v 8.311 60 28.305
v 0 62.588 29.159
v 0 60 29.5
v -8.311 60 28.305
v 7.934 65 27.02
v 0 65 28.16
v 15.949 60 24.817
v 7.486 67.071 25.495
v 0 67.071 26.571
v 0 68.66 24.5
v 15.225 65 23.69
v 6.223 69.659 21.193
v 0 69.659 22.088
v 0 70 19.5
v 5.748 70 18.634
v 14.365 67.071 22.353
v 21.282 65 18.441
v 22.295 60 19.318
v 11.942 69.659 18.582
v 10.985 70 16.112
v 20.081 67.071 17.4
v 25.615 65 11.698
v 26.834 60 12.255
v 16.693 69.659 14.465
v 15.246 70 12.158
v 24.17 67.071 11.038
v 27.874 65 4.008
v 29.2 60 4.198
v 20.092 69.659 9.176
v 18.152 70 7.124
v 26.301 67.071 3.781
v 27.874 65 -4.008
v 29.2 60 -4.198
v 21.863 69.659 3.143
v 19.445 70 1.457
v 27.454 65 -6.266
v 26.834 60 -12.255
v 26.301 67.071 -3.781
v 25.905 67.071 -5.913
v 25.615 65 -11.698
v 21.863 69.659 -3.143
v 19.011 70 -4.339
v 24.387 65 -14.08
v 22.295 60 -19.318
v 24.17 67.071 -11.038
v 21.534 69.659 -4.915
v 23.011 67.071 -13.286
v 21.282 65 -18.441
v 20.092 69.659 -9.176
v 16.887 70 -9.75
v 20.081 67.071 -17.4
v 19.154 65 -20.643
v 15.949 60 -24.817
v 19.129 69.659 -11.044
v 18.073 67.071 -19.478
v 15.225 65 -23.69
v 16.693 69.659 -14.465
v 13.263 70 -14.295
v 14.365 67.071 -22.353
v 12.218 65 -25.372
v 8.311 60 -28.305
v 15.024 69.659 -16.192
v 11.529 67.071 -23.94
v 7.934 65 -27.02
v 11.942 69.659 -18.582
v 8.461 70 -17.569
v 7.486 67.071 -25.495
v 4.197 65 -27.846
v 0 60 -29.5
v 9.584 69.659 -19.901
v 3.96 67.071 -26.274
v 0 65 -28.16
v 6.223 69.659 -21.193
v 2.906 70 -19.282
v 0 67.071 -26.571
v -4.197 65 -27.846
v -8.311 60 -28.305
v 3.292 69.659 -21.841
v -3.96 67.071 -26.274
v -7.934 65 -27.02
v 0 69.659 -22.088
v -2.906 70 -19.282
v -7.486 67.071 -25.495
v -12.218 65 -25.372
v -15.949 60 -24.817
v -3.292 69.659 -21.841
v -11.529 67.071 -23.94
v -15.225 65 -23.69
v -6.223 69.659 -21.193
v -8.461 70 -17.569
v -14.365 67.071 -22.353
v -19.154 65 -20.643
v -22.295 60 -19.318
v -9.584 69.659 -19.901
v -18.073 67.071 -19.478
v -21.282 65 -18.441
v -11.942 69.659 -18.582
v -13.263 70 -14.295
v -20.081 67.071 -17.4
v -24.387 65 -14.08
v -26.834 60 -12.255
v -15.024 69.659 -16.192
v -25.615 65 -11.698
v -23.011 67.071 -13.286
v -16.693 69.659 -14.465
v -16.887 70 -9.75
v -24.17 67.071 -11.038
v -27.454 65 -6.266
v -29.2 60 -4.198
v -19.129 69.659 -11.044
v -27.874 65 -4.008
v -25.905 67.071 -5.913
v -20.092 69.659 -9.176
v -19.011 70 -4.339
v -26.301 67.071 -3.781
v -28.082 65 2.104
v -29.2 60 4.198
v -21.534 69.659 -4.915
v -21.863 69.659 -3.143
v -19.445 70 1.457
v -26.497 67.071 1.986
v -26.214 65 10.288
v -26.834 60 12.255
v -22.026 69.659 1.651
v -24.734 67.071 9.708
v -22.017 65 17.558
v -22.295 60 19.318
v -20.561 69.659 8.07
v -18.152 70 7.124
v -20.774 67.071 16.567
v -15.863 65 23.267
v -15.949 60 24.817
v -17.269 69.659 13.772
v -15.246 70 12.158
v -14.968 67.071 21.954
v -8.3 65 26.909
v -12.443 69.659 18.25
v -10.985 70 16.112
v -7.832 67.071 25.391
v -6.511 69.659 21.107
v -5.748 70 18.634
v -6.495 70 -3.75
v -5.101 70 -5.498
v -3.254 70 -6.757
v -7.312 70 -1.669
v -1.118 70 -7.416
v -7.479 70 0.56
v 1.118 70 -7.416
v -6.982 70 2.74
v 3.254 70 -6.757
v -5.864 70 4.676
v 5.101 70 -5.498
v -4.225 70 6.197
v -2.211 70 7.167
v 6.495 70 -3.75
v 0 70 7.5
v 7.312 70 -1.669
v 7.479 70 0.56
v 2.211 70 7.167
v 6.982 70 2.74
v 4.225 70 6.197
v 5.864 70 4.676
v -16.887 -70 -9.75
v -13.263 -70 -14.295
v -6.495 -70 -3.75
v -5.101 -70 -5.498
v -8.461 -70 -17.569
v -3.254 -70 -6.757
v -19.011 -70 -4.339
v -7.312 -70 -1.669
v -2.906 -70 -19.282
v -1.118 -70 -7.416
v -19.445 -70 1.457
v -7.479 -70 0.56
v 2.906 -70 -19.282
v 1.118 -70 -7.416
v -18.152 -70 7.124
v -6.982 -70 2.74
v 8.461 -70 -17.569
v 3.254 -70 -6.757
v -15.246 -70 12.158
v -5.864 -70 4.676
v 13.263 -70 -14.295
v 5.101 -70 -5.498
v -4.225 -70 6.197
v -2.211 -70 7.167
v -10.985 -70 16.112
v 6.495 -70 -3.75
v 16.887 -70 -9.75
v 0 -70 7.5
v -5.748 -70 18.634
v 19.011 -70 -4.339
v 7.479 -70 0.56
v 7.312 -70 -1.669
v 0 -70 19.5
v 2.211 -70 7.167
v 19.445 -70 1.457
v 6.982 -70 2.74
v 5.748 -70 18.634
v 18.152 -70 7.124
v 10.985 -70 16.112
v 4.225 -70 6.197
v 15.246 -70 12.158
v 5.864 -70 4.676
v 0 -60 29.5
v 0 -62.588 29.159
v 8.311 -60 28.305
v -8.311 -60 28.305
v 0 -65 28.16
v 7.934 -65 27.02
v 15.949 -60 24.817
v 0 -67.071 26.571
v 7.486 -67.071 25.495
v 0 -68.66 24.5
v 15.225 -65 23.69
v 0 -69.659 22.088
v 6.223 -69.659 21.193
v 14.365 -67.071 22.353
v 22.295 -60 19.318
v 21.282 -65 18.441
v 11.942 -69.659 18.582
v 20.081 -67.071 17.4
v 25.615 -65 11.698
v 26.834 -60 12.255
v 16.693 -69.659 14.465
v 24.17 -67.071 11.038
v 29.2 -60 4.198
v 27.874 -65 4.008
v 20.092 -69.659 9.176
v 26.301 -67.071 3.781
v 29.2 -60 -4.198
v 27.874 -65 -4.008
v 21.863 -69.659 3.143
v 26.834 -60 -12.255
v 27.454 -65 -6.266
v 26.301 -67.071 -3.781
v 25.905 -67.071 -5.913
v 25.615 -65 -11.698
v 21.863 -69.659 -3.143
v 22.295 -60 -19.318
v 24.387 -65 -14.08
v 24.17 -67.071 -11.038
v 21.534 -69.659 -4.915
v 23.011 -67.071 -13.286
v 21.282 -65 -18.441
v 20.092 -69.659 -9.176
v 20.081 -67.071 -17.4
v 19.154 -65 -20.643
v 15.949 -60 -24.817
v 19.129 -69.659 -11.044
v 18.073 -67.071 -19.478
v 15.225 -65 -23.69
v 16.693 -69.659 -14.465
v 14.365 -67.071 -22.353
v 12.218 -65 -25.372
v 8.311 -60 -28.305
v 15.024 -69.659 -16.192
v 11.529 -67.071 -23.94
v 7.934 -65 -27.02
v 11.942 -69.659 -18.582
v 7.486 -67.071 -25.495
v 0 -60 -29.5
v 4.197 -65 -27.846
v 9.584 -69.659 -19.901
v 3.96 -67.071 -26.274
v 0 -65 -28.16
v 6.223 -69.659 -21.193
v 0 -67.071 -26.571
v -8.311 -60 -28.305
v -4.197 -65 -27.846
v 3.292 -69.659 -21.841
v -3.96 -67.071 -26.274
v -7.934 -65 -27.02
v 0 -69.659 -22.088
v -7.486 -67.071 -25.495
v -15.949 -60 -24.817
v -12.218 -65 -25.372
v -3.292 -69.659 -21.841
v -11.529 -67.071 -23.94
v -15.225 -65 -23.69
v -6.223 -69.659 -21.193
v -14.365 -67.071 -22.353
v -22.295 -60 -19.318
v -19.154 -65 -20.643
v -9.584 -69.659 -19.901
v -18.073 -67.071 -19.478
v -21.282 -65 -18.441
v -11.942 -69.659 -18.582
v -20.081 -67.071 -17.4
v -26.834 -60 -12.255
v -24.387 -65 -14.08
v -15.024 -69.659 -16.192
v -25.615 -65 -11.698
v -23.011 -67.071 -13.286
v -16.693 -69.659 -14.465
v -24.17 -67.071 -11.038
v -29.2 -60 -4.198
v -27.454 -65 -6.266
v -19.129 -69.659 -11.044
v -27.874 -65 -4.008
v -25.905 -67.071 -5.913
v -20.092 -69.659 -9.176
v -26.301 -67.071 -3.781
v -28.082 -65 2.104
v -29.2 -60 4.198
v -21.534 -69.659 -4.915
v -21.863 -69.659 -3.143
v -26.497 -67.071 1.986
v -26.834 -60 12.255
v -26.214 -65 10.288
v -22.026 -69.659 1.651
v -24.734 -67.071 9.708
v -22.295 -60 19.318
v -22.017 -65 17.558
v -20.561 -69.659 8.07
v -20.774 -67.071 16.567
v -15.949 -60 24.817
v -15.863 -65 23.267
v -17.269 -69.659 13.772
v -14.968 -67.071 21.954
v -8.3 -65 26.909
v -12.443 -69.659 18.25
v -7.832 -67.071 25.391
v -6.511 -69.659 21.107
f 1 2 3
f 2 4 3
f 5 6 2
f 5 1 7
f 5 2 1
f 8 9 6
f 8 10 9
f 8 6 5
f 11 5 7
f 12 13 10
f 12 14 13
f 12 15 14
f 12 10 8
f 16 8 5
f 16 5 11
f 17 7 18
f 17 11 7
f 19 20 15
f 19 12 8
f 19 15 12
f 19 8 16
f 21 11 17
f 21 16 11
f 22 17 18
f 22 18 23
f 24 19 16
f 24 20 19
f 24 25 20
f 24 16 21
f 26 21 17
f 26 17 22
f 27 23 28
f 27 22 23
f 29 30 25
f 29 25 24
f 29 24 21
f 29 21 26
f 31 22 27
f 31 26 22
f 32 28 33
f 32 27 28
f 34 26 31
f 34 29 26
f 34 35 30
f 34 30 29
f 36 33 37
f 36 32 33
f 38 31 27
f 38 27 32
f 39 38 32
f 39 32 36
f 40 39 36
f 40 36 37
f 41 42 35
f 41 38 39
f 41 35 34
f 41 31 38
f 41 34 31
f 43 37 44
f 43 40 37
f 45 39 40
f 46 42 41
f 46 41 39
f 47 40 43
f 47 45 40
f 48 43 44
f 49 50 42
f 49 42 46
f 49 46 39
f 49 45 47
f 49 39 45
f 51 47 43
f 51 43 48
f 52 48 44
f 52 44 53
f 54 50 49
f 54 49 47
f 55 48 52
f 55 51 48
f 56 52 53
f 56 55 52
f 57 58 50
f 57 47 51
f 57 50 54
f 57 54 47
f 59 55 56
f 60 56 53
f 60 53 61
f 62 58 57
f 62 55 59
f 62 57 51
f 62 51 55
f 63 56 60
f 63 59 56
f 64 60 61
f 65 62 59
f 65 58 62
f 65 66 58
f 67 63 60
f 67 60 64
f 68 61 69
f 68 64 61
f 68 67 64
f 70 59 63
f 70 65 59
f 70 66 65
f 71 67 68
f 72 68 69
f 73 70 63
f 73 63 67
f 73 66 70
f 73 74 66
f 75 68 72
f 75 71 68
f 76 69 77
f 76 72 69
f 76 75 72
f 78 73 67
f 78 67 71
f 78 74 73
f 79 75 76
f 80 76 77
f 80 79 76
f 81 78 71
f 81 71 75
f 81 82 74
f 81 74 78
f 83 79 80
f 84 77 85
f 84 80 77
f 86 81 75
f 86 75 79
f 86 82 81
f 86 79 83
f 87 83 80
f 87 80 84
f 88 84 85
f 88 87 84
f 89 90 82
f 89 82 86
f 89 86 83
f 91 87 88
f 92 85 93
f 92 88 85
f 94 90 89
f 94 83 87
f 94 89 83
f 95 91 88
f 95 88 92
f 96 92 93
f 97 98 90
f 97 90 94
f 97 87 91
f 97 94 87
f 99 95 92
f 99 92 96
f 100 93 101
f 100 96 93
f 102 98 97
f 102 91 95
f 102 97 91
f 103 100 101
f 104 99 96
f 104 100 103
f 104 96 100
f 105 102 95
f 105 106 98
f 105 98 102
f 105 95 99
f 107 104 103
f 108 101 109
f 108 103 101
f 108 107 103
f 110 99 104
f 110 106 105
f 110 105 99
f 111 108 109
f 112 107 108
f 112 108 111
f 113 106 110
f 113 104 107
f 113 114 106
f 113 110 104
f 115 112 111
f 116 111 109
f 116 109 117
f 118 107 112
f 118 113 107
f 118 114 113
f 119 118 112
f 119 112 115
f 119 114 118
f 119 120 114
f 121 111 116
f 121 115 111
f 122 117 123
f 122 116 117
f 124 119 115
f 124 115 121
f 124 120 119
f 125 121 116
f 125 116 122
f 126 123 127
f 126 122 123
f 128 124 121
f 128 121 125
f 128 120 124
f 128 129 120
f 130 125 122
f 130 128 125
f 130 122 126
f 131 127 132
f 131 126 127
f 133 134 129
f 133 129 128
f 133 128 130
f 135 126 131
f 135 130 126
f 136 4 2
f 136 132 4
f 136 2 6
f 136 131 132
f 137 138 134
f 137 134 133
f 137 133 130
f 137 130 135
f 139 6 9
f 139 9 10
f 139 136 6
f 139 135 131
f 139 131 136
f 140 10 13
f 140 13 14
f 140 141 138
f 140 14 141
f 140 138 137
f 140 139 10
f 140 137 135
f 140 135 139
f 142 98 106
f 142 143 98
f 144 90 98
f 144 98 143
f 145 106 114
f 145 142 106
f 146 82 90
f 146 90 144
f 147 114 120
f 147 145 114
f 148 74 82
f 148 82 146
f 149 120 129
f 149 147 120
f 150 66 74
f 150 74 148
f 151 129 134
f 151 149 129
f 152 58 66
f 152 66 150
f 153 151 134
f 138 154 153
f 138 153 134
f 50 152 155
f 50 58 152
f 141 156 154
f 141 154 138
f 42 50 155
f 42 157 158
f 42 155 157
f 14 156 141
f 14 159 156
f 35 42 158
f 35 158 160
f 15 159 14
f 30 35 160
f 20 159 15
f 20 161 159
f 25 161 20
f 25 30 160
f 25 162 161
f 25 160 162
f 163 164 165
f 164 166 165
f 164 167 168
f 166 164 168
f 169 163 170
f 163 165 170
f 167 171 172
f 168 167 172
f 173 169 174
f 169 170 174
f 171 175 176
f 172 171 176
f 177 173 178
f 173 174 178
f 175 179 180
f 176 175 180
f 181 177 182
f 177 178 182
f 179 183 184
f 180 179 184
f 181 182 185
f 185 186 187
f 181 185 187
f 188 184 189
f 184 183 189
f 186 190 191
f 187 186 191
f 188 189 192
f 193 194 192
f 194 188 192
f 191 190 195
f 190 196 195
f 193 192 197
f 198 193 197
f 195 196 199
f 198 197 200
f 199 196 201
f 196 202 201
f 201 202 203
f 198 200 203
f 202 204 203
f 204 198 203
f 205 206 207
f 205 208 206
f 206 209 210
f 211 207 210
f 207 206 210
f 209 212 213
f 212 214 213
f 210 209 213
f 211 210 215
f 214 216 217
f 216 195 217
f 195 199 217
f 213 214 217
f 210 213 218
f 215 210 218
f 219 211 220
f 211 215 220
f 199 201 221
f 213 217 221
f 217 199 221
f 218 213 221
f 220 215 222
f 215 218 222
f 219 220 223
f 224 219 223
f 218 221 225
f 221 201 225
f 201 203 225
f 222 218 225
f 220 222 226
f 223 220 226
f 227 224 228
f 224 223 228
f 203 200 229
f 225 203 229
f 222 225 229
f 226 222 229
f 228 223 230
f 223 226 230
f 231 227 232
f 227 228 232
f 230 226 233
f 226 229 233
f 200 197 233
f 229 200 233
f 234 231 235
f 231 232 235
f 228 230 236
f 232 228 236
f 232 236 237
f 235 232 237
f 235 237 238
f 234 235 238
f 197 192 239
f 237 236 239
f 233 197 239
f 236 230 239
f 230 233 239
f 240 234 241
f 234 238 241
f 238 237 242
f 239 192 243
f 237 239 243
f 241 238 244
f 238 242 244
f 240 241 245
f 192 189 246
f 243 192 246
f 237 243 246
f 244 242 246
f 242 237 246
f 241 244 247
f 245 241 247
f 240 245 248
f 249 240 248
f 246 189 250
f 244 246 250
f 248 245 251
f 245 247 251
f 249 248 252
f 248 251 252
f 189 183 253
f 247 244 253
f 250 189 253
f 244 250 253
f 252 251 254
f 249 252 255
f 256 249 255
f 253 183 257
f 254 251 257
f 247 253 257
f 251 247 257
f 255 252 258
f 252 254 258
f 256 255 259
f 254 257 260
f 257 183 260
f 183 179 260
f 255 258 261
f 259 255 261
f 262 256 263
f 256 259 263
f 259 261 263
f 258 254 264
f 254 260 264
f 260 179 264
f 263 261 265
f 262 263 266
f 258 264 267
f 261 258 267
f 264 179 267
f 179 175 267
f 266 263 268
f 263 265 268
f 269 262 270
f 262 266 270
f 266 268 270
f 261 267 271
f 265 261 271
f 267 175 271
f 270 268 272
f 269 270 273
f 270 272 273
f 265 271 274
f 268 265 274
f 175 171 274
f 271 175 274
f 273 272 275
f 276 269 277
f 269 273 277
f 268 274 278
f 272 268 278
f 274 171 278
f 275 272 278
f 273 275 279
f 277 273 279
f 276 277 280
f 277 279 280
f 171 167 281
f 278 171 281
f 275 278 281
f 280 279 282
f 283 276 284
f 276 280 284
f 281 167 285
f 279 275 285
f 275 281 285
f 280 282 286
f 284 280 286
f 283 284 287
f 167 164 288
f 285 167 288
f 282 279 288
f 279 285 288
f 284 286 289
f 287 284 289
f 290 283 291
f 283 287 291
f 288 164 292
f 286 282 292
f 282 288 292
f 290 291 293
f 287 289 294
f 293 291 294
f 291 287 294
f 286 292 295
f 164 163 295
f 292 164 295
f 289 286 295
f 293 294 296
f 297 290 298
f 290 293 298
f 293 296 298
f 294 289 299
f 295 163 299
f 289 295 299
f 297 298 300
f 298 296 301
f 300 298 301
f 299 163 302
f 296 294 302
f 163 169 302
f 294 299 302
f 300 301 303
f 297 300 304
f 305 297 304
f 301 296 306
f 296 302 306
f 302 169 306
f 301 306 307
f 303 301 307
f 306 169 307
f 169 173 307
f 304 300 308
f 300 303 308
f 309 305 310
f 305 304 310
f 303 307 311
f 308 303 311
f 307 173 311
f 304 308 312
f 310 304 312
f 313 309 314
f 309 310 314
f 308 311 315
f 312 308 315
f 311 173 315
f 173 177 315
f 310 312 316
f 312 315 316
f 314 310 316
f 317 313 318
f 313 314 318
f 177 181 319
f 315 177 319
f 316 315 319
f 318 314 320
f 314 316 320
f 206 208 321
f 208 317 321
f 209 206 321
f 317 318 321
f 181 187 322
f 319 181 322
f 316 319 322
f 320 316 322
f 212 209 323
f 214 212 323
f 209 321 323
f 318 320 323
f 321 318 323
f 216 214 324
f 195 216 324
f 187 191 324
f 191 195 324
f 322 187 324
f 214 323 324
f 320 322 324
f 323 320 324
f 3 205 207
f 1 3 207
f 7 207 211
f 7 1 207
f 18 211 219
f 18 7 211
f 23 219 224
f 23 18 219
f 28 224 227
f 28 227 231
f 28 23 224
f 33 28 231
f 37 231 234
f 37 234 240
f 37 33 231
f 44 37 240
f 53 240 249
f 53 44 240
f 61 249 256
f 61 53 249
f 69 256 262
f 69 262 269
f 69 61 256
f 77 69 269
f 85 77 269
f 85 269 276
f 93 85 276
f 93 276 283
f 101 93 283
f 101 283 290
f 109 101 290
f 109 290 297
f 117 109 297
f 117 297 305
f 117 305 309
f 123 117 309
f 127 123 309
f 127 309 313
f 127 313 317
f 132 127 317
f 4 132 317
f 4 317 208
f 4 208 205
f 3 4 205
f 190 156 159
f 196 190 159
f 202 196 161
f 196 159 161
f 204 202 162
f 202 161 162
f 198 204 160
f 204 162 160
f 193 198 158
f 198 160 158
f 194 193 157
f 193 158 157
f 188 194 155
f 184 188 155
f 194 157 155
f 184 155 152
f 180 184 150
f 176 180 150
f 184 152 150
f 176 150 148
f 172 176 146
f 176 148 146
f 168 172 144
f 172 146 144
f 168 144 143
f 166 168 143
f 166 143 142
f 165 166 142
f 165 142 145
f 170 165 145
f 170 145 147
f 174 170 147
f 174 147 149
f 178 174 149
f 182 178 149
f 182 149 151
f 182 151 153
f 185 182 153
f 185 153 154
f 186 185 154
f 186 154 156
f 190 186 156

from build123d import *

# Parameters (mm, degrees)
SKETCH1_R           = 29.5
BOSS_EXTRUDE1_DEPTH = 70
FILLET1_R           = 10
SKETCH2_R           = 7.5
CUT_EXTRUDE1_DEPTH  = 147.083880034


with BuildPart() as part:
    # Sketch1 → Boss-Extrude1 (new, symmetric)
    with BuildSketch(Plane(origin=(0, 0, 0), x_dir=(1, 0, 0), z_dir=(0, 1, 0))):
        with Locations(Location((0, 0, 0), (0, 0, 270))):
            Circle(SKETCH1_R)
    extrude(amount=BOSS_EXTRUDE1_DEPTH, both=True)

    # Fillet1
    fillet1_edges = [part.edges().sort_by_distance(p)[0] for p in [
        (0, -70, -29.5),
        (0, 70, -29.5),
    ]]
    fillet(fillet1_edges, radius=FILLET1_R)

    # Sketch2 → Cut-Extrude1 (cut, through all)
    with BuildSketch(Plane(origin=(0, 70, 0), x_dir=(1, 0, 0), z_dir=(0, 1, 0))):
        with Locations(Location((0, 0, 0), (0, 0, 270))):
            Circle(SKETCH2_R)
    extrude(amount=-CUT_EXTRUDE1_DEPTH, mode=Mode.SUBTRACT)


solid = part.part
